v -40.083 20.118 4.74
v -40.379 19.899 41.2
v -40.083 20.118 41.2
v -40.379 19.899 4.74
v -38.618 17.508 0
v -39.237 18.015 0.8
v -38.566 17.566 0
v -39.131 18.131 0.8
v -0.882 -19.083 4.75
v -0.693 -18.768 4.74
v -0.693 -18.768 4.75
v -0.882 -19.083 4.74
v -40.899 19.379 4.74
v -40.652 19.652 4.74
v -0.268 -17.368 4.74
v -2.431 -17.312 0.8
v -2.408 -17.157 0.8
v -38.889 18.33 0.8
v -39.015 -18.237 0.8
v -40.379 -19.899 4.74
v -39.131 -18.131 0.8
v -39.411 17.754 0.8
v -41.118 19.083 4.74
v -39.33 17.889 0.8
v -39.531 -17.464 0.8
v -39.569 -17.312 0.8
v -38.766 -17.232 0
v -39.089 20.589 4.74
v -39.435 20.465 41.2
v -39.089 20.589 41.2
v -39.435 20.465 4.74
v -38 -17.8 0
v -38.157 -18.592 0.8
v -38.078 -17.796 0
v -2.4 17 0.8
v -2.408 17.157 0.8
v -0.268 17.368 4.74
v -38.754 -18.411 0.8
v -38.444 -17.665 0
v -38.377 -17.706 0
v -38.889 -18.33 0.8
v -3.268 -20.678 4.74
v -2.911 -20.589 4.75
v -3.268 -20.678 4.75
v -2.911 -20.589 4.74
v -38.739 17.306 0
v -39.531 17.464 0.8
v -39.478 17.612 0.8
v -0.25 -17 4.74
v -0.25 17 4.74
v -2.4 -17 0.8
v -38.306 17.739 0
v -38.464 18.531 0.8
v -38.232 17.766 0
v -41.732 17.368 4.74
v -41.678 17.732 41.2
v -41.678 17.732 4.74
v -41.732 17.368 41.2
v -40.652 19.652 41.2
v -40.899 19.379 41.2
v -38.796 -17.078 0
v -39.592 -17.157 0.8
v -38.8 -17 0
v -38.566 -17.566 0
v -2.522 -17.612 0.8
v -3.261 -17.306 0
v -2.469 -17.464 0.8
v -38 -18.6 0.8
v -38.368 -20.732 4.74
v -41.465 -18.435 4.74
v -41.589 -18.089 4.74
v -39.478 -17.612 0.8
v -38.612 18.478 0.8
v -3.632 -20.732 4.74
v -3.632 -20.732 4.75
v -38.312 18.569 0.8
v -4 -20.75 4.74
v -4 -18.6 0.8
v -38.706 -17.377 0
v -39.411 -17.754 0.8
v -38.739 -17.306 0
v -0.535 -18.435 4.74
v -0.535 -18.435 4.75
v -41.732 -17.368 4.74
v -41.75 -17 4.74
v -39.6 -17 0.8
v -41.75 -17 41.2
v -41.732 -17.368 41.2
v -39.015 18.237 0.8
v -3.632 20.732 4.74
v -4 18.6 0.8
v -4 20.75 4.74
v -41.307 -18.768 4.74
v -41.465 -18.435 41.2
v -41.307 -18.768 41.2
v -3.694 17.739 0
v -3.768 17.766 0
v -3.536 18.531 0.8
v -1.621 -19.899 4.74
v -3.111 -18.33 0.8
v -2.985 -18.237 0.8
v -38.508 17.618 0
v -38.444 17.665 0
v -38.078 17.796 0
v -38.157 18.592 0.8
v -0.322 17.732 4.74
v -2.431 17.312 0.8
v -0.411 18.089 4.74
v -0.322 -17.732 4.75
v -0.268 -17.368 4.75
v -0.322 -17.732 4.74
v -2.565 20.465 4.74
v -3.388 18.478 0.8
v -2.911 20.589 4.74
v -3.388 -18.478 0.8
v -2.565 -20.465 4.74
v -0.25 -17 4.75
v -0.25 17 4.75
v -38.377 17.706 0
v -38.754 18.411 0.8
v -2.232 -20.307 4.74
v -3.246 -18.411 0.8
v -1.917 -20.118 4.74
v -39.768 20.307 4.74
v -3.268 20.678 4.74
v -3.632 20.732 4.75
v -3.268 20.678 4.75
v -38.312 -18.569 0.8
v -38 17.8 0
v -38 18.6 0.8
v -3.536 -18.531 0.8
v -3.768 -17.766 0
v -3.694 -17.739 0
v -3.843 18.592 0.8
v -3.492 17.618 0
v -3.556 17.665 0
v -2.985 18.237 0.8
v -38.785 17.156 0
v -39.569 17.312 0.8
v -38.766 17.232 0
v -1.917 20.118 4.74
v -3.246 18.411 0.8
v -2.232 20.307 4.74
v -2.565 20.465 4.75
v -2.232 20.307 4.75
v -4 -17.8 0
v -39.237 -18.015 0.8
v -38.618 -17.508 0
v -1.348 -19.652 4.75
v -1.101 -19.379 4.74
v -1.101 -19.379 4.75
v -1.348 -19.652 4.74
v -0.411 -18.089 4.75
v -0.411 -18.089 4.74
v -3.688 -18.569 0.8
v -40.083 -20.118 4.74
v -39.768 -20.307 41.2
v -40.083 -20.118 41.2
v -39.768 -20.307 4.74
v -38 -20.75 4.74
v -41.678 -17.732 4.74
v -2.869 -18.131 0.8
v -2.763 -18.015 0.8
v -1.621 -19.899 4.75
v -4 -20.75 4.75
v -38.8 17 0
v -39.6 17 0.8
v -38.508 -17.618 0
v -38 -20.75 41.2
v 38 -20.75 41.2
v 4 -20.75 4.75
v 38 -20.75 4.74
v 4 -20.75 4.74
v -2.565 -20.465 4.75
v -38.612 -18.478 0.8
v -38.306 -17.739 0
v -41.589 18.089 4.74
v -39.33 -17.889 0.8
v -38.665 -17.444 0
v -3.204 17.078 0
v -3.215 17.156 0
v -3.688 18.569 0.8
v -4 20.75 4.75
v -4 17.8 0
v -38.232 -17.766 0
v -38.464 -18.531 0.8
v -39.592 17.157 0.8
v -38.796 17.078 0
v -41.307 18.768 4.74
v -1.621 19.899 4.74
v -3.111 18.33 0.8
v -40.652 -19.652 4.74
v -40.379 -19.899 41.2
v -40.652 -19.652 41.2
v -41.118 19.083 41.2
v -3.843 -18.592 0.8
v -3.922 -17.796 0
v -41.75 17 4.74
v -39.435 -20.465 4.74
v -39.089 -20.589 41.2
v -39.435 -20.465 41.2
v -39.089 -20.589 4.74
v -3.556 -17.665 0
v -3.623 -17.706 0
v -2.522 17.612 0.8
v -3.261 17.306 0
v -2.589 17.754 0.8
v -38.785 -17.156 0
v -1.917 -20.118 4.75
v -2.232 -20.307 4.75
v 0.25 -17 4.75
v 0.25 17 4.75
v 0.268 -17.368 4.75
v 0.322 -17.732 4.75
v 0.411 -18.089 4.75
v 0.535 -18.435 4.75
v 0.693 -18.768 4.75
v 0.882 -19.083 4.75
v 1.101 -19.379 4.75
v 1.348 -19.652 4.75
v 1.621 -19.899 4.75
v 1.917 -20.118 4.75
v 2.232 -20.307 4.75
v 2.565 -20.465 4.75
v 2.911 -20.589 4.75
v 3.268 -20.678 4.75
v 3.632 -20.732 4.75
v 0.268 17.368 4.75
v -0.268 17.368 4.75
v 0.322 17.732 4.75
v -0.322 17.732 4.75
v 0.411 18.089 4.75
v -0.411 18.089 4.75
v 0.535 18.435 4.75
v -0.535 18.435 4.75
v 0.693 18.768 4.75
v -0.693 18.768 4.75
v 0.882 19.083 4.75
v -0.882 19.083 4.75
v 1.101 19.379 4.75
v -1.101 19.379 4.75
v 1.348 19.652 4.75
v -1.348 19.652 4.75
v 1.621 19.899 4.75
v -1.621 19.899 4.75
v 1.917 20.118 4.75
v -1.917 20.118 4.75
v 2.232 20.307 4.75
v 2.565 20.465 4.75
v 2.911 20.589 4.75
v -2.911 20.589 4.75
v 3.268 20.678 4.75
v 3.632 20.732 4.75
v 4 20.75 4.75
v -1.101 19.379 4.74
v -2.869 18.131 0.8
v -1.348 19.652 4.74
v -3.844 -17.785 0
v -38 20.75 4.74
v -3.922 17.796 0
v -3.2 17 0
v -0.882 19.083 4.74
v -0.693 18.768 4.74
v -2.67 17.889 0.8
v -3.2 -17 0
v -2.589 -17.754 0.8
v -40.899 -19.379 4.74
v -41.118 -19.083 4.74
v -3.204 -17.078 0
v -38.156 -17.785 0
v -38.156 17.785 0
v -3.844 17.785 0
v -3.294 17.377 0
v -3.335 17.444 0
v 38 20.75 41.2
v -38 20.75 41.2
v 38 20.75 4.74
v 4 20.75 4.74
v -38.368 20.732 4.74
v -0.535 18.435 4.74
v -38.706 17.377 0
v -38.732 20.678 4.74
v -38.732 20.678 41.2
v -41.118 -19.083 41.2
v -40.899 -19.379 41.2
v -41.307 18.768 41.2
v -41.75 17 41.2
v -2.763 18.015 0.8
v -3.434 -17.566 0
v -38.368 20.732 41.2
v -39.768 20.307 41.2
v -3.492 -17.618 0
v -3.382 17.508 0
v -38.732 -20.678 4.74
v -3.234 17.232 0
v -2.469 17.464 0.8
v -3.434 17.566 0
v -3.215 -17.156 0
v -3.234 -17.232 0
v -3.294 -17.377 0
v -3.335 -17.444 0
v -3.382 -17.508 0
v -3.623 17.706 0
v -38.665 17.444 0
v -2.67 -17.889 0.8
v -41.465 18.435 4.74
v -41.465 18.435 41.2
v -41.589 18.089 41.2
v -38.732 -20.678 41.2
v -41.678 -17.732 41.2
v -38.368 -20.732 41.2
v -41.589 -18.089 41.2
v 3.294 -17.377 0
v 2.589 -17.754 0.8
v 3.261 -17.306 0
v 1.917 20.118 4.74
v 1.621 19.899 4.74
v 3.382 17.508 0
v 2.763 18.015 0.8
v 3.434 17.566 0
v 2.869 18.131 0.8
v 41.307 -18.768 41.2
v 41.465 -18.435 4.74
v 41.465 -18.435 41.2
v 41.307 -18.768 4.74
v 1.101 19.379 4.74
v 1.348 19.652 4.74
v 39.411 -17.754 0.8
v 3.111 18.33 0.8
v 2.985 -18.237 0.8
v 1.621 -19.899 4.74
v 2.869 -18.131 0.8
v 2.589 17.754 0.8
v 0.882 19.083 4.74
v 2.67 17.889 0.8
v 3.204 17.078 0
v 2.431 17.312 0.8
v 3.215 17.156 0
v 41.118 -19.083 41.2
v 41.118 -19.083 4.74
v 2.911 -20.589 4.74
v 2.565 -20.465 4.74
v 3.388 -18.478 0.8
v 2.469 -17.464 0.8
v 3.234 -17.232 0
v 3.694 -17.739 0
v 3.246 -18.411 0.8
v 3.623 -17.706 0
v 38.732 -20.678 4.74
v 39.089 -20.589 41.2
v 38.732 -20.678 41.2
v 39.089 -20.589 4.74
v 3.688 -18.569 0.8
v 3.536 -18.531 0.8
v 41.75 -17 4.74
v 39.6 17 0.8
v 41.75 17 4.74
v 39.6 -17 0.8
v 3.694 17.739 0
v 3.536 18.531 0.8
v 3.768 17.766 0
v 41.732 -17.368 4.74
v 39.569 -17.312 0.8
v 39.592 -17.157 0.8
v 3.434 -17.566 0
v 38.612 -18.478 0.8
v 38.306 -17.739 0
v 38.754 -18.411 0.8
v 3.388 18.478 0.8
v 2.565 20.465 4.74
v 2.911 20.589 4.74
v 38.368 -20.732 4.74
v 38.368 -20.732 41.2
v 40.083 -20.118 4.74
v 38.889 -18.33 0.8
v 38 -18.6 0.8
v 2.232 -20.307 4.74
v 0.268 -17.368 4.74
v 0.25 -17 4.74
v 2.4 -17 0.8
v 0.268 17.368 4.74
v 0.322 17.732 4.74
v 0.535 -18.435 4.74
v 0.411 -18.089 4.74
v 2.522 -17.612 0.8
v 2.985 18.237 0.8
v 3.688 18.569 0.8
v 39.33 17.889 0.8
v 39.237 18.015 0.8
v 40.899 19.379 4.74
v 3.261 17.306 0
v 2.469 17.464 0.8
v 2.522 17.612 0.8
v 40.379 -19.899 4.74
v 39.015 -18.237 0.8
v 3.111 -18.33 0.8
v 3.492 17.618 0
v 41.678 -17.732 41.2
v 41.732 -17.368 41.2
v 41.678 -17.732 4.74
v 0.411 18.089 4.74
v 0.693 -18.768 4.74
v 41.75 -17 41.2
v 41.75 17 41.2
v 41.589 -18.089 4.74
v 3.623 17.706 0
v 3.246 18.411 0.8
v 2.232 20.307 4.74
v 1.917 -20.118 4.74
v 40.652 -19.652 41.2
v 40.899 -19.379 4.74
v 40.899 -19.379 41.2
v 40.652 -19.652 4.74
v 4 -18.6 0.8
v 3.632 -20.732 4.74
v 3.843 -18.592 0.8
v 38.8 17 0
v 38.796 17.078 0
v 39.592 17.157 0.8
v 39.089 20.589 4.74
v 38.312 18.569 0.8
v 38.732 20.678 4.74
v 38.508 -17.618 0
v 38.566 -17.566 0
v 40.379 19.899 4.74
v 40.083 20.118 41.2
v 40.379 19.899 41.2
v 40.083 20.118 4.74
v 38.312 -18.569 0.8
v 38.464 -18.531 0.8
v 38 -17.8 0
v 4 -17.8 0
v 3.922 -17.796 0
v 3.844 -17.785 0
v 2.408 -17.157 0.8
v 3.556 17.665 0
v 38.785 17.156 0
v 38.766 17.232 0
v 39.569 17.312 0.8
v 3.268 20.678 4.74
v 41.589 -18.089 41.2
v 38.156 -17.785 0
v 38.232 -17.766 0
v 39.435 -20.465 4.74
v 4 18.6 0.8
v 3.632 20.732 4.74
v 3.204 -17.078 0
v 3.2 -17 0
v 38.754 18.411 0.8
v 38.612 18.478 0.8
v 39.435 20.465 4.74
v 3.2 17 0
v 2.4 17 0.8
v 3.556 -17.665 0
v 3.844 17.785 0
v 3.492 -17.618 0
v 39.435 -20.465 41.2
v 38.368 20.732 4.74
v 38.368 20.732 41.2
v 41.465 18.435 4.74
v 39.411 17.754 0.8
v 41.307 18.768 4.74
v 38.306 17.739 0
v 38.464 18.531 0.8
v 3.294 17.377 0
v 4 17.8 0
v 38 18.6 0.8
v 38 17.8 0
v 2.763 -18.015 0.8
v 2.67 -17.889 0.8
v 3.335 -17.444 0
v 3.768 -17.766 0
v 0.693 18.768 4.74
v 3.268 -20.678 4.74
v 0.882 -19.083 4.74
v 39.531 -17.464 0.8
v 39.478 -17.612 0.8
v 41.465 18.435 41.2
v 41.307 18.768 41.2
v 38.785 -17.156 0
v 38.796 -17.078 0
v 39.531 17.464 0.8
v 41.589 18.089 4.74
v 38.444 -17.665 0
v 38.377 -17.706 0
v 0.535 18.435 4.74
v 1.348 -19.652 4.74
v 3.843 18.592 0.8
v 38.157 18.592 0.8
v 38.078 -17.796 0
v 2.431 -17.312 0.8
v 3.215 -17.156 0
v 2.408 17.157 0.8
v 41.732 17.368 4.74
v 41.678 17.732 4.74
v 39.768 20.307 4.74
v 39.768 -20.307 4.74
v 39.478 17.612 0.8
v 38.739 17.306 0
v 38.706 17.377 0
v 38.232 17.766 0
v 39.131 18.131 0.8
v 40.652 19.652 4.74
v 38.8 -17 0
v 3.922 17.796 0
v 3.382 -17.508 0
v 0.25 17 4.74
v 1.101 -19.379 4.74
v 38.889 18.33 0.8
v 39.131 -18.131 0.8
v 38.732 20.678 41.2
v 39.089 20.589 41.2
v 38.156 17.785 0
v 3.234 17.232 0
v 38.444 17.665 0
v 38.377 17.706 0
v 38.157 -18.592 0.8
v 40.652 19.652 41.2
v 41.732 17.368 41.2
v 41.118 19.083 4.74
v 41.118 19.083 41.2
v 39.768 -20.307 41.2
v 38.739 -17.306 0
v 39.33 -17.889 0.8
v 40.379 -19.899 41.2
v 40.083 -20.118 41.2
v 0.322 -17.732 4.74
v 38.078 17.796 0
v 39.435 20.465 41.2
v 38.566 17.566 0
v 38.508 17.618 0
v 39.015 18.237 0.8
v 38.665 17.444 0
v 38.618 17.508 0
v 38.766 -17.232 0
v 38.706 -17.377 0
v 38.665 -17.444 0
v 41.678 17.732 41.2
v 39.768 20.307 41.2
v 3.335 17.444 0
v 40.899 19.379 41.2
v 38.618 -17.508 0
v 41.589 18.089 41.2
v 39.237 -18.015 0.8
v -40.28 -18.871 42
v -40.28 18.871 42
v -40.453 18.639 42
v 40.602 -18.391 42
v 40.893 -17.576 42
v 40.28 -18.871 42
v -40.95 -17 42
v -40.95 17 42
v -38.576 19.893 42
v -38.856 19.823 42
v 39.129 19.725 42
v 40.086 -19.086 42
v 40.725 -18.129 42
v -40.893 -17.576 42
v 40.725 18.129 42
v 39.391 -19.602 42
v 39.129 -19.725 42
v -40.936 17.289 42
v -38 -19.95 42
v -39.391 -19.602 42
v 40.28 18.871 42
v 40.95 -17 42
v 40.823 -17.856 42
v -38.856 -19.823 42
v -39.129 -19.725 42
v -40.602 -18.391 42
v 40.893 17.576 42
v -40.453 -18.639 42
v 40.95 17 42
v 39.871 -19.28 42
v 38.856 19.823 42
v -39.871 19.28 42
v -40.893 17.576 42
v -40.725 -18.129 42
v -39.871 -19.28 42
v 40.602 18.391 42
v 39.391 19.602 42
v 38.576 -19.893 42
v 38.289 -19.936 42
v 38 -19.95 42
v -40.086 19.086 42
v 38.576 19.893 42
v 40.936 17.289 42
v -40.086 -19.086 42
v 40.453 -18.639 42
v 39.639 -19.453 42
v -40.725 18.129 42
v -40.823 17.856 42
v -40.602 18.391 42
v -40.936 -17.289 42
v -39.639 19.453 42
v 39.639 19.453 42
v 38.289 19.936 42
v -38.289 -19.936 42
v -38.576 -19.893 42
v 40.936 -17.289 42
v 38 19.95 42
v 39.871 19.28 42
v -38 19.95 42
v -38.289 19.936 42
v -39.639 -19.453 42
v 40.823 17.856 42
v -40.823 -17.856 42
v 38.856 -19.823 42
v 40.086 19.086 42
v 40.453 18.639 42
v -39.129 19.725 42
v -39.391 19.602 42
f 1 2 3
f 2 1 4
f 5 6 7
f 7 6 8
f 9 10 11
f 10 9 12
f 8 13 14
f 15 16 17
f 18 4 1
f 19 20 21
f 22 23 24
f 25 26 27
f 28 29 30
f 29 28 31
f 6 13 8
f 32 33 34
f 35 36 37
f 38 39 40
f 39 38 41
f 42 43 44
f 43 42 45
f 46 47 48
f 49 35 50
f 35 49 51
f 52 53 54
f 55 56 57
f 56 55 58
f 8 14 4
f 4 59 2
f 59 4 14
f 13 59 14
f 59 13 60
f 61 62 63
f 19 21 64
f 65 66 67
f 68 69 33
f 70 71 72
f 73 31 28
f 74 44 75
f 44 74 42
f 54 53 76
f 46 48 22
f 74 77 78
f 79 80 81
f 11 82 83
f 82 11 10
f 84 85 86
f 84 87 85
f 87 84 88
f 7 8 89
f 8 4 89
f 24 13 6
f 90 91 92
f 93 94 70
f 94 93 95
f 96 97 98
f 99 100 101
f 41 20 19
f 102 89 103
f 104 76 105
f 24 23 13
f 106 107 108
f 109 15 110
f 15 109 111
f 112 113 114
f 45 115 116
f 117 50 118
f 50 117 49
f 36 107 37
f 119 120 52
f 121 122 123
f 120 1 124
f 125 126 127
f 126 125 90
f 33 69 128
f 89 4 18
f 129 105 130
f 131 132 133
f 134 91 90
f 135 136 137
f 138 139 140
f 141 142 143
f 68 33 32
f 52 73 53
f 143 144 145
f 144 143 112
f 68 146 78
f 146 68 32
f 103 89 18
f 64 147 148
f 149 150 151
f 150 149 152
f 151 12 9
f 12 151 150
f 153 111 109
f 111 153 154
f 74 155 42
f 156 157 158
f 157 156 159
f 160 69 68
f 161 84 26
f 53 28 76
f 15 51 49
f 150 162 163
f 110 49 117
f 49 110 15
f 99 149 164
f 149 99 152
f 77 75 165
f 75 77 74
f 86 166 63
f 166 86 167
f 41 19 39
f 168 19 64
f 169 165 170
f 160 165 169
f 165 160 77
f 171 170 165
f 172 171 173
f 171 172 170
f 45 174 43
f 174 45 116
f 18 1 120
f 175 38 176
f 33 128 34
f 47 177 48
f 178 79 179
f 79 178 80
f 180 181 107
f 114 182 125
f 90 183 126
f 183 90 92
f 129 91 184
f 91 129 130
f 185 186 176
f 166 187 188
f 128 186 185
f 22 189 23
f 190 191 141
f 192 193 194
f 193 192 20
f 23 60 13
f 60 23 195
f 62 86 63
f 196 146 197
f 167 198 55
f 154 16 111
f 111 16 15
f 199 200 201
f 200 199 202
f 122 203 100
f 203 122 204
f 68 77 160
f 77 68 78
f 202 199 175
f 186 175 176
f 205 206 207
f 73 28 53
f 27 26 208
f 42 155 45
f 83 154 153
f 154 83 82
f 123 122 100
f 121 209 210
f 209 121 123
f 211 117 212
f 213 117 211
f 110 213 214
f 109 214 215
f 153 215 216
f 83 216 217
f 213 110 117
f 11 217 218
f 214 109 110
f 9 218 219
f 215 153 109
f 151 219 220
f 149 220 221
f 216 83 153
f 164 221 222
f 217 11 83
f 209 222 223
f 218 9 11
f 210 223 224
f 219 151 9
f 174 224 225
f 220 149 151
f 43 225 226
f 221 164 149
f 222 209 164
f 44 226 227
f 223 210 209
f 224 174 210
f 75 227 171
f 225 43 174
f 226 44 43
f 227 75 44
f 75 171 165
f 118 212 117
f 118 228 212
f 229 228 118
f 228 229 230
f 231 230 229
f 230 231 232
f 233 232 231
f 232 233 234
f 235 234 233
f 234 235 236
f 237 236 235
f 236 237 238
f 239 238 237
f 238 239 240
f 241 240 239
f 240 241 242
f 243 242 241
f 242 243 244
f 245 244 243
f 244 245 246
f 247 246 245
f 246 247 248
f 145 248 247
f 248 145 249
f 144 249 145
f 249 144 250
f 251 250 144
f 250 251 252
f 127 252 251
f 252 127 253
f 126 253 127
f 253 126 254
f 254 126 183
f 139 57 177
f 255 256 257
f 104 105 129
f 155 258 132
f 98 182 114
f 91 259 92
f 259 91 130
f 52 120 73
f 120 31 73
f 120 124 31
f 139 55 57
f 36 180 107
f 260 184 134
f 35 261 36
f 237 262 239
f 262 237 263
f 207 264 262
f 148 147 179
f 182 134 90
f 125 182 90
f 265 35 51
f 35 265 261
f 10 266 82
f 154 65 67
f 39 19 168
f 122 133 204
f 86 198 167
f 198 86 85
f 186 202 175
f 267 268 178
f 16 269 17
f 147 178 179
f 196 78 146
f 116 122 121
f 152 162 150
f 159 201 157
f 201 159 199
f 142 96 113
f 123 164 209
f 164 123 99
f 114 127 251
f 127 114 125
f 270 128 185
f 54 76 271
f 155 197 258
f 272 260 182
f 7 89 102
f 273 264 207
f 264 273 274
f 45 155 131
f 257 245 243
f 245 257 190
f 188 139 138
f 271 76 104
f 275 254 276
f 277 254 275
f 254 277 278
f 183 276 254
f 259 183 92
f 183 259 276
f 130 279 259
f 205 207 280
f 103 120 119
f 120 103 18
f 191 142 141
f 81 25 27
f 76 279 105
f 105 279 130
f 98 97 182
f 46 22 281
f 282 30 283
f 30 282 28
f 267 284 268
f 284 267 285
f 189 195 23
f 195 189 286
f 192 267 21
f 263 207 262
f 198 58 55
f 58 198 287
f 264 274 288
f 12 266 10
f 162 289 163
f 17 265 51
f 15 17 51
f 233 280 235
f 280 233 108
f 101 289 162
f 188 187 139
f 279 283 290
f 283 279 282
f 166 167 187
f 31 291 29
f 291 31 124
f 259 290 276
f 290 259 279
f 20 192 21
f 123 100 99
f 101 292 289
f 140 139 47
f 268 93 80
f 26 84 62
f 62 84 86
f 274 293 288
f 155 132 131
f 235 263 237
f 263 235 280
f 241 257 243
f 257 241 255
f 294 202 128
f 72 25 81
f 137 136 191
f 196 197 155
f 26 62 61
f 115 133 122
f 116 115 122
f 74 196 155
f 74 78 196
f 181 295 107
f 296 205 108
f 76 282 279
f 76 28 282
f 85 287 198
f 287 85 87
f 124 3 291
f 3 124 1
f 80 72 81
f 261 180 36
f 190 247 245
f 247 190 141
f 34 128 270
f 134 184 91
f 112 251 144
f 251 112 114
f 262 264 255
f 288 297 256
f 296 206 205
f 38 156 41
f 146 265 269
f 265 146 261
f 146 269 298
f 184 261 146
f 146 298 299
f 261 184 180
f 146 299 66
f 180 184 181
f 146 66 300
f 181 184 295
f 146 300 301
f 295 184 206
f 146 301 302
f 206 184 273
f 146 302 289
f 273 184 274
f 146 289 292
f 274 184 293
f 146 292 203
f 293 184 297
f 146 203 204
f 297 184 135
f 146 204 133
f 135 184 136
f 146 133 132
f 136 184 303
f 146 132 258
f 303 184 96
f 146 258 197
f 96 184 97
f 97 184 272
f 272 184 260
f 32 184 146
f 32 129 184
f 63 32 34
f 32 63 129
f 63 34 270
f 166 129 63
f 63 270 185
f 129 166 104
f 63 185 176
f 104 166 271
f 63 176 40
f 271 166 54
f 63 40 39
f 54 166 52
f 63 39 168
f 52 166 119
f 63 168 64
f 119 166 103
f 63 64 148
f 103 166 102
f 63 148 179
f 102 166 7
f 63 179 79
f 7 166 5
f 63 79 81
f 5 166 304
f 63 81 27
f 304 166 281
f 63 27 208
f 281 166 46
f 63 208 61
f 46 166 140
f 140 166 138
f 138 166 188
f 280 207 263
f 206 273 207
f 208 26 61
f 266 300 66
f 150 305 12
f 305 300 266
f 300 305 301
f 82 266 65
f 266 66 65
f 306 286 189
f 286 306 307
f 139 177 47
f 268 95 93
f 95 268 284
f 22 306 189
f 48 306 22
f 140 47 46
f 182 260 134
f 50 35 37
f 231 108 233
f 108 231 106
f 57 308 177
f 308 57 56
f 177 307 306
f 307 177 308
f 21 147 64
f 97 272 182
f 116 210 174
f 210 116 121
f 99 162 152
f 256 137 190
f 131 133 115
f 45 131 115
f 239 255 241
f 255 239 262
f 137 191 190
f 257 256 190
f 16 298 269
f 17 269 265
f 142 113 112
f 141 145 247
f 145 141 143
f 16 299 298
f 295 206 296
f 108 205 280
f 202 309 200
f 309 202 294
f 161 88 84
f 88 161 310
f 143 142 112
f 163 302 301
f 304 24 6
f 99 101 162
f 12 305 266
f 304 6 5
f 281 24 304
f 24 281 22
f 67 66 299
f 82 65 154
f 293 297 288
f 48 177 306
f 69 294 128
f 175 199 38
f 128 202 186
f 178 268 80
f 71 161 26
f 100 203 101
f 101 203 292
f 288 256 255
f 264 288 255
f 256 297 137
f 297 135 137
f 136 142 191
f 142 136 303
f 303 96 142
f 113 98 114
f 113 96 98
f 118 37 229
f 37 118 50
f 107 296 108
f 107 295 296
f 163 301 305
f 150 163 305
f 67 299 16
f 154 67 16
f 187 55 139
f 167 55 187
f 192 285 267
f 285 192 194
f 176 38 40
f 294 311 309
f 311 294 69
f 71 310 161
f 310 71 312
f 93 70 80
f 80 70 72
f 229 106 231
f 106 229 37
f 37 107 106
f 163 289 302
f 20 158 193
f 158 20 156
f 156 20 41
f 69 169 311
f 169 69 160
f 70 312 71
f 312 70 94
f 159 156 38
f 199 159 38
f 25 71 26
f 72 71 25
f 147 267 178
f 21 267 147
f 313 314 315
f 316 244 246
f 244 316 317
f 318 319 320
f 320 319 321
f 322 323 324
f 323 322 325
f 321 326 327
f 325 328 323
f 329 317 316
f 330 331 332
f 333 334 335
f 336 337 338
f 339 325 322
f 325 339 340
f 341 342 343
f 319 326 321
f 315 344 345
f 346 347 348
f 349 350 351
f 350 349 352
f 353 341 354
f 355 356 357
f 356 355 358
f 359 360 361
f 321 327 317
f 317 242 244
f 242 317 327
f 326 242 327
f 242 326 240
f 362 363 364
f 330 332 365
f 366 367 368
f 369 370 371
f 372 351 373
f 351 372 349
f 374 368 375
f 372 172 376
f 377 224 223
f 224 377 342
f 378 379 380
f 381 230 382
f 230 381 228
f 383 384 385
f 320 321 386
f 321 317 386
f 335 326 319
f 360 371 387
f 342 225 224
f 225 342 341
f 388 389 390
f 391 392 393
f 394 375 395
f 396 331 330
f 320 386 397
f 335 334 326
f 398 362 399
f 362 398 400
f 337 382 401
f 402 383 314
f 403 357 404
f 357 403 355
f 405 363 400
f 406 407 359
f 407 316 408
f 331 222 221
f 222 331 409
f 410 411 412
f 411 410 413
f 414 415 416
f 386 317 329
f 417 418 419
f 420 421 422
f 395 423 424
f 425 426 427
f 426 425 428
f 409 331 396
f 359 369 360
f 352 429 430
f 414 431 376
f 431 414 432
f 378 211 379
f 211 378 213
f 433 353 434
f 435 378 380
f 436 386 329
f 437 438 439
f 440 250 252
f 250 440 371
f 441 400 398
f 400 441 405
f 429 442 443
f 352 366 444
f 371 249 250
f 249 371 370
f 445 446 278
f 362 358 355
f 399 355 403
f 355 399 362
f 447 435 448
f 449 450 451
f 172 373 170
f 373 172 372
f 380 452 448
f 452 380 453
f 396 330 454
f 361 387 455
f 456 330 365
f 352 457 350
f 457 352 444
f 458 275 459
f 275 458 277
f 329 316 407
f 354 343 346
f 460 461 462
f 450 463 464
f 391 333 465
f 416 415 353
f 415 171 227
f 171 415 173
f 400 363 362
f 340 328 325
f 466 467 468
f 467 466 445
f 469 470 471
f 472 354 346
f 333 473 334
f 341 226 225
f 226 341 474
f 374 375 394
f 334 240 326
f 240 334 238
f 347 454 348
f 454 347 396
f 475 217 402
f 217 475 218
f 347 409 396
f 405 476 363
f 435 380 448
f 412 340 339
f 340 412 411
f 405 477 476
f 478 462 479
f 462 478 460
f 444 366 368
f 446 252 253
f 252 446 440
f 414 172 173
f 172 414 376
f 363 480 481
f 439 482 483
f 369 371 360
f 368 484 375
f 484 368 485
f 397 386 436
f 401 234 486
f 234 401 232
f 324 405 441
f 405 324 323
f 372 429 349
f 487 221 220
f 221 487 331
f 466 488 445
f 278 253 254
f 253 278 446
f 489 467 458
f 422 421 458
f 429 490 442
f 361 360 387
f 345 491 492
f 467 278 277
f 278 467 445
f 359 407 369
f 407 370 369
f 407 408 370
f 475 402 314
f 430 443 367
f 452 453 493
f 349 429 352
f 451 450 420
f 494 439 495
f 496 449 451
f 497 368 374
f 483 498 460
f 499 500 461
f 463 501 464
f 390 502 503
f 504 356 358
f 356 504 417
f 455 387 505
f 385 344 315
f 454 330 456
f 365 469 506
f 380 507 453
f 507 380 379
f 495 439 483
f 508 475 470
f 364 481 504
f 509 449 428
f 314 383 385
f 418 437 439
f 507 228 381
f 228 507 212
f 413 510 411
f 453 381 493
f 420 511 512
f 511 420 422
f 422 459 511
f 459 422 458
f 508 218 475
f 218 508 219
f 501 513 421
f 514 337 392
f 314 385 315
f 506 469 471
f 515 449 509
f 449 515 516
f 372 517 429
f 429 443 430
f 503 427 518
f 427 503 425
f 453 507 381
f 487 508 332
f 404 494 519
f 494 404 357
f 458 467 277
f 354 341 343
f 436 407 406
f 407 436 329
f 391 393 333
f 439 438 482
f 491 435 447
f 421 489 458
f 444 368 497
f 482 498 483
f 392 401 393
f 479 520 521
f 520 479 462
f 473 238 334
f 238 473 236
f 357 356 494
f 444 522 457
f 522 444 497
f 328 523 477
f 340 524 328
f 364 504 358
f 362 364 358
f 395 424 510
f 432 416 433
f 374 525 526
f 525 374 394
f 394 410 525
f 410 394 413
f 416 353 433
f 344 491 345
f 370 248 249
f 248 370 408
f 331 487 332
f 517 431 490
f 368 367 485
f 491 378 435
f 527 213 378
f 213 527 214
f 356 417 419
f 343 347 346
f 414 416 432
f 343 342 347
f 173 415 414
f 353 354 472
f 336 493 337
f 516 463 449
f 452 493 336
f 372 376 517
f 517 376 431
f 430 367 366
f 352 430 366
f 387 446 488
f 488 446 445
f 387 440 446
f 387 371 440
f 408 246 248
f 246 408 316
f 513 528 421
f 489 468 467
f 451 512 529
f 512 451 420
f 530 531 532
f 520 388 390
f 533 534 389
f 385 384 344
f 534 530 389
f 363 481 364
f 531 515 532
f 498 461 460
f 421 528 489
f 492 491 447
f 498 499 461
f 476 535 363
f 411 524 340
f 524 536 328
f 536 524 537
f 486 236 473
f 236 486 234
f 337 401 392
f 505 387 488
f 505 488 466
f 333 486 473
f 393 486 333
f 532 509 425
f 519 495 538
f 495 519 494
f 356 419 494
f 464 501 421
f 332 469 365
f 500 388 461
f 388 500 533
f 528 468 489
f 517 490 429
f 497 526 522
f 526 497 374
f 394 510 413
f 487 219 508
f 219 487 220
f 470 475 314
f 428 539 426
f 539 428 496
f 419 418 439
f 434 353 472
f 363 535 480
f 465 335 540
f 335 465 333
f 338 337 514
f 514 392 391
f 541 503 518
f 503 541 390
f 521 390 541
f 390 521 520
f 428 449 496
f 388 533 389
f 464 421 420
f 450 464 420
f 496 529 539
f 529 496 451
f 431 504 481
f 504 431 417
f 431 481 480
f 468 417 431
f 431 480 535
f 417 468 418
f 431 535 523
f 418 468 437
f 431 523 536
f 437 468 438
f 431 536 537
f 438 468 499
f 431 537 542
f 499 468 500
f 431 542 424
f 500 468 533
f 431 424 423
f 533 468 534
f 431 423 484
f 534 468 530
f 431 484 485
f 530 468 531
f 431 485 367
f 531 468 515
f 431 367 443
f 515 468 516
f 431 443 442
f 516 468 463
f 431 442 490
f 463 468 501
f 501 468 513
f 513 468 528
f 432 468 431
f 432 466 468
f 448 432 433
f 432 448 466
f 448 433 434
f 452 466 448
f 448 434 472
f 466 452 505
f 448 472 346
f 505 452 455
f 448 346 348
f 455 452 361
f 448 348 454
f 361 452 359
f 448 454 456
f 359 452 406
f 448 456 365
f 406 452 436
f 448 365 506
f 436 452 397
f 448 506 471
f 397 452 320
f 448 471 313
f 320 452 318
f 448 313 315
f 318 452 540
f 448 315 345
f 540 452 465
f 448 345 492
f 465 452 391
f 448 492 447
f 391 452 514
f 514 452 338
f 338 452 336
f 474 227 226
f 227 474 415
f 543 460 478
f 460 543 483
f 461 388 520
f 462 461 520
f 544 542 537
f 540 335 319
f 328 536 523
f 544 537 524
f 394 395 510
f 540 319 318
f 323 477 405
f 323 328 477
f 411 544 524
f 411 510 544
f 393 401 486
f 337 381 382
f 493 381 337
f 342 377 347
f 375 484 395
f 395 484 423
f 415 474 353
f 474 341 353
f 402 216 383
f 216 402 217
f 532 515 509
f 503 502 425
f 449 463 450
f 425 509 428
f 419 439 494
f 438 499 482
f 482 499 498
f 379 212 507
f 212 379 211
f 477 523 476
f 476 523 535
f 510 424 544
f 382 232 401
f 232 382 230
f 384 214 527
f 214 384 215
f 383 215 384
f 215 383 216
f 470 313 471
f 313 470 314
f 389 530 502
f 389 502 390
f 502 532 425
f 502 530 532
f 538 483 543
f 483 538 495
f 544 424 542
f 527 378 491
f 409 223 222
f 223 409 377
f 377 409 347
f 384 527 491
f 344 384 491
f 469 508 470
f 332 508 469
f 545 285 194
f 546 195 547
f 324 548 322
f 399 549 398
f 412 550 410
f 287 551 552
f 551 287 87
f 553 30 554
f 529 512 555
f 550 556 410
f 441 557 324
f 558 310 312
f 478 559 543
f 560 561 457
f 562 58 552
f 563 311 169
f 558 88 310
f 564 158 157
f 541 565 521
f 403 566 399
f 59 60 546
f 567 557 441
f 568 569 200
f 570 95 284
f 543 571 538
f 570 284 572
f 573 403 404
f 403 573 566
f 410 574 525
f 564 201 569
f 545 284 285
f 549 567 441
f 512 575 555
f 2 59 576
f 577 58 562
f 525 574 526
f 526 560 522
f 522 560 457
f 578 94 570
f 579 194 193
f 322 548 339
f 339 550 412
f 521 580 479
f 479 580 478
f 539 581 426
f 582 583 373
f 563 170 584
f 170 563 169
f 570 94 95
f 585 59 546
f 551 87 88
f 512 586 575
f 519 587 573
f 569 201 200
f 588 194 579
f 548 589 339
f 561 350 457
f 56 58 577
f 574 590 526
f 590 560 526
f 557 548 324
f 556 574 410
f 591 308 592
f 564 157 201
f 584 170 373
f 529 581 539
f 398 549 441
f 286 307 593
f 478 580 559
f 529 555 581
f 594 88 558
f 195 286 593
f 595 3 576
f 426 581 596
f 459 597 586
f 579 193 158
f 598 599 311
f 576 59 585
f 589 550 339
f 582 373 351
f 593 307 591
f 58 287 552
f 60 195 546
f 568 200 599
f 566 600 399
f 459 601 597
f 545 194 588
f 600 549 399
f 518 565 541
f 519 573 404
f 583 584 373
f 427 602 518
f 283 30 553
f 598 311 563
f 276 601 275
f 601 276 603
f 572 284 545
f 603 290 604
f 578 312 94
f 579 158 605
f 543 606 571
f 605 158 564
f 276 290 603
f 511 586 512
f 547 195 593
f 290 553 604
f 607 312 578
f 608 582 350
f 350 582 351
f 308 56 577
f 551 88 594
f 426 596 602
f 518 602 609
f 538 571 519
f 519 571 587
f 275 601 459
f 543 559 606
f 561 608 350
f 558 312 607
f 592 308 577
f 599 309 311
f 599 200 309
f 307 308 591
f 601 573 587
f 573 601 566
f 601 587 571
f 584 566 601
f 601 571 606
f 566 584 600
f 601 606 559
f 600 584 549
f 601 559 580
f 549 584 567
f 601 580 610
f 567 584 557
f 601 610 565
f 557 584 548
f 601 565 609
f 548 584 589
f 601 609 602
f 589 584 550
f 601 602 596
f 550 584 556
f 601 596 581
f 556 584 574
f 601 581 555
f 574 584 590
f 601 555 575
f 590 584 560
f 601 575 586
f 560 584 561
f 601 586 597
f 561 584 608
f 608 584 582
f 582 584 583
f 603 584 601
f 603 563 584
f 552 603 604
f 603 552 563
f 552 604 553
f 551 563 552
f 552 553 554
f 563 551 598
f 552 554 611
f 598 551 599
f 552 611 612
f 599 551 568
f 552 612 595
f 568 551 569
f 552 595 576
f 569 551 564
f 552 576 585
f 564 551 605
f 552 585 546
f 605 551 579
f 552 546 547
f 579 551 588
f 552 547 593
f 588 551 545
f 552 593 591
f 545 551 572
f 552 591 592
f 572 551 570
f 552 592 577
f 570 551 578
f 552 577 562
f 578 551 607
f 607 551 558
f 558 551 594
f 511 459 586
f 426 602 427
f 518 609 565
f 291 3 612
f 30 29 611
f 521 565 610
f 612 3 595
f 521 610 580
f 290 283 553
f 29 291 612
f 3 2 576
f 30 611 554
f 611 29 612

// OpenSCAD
// Gridfinity bin base, no library. Copy into a model and keep the numbers.
// Foot profile matches kennetek/gridfinity-rebuilt-openscad: 0.8 chamfer + 1.8 straight + 2.15 chamfer.
// Printed and checked on a dozen bins (print-kit author, Bambu P2S, PLA, 0.4 nozzle).

grid_x = 2;             // cells along X
grid_y = 1;             // cells along Y
height_units = 6;       // 7 mm each
outer_chamfer = 0.8;    // top outside edge break

/* [Hidden] */
$fn    = 64;
pitch  = 42;
cell   = 41.5;          // cell footprint (0.25 mm gap each side)
base_h = 4.75;          // standard base profile height
outer_r = 3.75;
bin_h  = height_units * 7;
bin_x  = grid_x * pitch - 0.5;
bin_y  = grid_y * pitch - 0.5;

module rrect2(x, y, r) {
    offset(r) square([x - 2 * r, y - 2 * r], center = true);
}

module rrect(x, y, r, h) {
    linear_extrude(h) rrect2(x, y, r);
}

// One Gridfinity foot: 0.8 chamfer, 1.8 straight, 2.15 chamfer.
module foot() {
    hull() {
        rrect(cell - 2 * 2.95, cell - 2 * 2.95, 0.8, 0.01);
        translate([0, 0, 0.8])  rrect(cell - 2 * 2.15, cell - 2 * 2.15, 1.6, 1.8);
        translate([0, 0, base_h - 0.01]) rrect(cell, cell, outer_r, 0.01);
    }
}

module body() {
    for (i = [0 : grid_x - 1], j = [0 : grid_y - 1])
        translate([(i - (grid_x - 1) / 2) * pitch, (j - (grid_y - 1) / 2) * pitch, 0])
            foot();
    // Both hull parts start at base_h so the feet stay exposed. A hull from z = 0 buries them.
    hull() {
        translate([0, 0, base_h]) rrect(bin_x, bin_y, outer_r, bin_h - base_h - outer_chamfer);
        translate([0, 0, base_h])
            rrect(bin_x - 2 * outer_chamfer, bin_y - 2 * outer_chamfer, outer_r - outer_chamfer, bin_h - base_h);
    }
}

body();
